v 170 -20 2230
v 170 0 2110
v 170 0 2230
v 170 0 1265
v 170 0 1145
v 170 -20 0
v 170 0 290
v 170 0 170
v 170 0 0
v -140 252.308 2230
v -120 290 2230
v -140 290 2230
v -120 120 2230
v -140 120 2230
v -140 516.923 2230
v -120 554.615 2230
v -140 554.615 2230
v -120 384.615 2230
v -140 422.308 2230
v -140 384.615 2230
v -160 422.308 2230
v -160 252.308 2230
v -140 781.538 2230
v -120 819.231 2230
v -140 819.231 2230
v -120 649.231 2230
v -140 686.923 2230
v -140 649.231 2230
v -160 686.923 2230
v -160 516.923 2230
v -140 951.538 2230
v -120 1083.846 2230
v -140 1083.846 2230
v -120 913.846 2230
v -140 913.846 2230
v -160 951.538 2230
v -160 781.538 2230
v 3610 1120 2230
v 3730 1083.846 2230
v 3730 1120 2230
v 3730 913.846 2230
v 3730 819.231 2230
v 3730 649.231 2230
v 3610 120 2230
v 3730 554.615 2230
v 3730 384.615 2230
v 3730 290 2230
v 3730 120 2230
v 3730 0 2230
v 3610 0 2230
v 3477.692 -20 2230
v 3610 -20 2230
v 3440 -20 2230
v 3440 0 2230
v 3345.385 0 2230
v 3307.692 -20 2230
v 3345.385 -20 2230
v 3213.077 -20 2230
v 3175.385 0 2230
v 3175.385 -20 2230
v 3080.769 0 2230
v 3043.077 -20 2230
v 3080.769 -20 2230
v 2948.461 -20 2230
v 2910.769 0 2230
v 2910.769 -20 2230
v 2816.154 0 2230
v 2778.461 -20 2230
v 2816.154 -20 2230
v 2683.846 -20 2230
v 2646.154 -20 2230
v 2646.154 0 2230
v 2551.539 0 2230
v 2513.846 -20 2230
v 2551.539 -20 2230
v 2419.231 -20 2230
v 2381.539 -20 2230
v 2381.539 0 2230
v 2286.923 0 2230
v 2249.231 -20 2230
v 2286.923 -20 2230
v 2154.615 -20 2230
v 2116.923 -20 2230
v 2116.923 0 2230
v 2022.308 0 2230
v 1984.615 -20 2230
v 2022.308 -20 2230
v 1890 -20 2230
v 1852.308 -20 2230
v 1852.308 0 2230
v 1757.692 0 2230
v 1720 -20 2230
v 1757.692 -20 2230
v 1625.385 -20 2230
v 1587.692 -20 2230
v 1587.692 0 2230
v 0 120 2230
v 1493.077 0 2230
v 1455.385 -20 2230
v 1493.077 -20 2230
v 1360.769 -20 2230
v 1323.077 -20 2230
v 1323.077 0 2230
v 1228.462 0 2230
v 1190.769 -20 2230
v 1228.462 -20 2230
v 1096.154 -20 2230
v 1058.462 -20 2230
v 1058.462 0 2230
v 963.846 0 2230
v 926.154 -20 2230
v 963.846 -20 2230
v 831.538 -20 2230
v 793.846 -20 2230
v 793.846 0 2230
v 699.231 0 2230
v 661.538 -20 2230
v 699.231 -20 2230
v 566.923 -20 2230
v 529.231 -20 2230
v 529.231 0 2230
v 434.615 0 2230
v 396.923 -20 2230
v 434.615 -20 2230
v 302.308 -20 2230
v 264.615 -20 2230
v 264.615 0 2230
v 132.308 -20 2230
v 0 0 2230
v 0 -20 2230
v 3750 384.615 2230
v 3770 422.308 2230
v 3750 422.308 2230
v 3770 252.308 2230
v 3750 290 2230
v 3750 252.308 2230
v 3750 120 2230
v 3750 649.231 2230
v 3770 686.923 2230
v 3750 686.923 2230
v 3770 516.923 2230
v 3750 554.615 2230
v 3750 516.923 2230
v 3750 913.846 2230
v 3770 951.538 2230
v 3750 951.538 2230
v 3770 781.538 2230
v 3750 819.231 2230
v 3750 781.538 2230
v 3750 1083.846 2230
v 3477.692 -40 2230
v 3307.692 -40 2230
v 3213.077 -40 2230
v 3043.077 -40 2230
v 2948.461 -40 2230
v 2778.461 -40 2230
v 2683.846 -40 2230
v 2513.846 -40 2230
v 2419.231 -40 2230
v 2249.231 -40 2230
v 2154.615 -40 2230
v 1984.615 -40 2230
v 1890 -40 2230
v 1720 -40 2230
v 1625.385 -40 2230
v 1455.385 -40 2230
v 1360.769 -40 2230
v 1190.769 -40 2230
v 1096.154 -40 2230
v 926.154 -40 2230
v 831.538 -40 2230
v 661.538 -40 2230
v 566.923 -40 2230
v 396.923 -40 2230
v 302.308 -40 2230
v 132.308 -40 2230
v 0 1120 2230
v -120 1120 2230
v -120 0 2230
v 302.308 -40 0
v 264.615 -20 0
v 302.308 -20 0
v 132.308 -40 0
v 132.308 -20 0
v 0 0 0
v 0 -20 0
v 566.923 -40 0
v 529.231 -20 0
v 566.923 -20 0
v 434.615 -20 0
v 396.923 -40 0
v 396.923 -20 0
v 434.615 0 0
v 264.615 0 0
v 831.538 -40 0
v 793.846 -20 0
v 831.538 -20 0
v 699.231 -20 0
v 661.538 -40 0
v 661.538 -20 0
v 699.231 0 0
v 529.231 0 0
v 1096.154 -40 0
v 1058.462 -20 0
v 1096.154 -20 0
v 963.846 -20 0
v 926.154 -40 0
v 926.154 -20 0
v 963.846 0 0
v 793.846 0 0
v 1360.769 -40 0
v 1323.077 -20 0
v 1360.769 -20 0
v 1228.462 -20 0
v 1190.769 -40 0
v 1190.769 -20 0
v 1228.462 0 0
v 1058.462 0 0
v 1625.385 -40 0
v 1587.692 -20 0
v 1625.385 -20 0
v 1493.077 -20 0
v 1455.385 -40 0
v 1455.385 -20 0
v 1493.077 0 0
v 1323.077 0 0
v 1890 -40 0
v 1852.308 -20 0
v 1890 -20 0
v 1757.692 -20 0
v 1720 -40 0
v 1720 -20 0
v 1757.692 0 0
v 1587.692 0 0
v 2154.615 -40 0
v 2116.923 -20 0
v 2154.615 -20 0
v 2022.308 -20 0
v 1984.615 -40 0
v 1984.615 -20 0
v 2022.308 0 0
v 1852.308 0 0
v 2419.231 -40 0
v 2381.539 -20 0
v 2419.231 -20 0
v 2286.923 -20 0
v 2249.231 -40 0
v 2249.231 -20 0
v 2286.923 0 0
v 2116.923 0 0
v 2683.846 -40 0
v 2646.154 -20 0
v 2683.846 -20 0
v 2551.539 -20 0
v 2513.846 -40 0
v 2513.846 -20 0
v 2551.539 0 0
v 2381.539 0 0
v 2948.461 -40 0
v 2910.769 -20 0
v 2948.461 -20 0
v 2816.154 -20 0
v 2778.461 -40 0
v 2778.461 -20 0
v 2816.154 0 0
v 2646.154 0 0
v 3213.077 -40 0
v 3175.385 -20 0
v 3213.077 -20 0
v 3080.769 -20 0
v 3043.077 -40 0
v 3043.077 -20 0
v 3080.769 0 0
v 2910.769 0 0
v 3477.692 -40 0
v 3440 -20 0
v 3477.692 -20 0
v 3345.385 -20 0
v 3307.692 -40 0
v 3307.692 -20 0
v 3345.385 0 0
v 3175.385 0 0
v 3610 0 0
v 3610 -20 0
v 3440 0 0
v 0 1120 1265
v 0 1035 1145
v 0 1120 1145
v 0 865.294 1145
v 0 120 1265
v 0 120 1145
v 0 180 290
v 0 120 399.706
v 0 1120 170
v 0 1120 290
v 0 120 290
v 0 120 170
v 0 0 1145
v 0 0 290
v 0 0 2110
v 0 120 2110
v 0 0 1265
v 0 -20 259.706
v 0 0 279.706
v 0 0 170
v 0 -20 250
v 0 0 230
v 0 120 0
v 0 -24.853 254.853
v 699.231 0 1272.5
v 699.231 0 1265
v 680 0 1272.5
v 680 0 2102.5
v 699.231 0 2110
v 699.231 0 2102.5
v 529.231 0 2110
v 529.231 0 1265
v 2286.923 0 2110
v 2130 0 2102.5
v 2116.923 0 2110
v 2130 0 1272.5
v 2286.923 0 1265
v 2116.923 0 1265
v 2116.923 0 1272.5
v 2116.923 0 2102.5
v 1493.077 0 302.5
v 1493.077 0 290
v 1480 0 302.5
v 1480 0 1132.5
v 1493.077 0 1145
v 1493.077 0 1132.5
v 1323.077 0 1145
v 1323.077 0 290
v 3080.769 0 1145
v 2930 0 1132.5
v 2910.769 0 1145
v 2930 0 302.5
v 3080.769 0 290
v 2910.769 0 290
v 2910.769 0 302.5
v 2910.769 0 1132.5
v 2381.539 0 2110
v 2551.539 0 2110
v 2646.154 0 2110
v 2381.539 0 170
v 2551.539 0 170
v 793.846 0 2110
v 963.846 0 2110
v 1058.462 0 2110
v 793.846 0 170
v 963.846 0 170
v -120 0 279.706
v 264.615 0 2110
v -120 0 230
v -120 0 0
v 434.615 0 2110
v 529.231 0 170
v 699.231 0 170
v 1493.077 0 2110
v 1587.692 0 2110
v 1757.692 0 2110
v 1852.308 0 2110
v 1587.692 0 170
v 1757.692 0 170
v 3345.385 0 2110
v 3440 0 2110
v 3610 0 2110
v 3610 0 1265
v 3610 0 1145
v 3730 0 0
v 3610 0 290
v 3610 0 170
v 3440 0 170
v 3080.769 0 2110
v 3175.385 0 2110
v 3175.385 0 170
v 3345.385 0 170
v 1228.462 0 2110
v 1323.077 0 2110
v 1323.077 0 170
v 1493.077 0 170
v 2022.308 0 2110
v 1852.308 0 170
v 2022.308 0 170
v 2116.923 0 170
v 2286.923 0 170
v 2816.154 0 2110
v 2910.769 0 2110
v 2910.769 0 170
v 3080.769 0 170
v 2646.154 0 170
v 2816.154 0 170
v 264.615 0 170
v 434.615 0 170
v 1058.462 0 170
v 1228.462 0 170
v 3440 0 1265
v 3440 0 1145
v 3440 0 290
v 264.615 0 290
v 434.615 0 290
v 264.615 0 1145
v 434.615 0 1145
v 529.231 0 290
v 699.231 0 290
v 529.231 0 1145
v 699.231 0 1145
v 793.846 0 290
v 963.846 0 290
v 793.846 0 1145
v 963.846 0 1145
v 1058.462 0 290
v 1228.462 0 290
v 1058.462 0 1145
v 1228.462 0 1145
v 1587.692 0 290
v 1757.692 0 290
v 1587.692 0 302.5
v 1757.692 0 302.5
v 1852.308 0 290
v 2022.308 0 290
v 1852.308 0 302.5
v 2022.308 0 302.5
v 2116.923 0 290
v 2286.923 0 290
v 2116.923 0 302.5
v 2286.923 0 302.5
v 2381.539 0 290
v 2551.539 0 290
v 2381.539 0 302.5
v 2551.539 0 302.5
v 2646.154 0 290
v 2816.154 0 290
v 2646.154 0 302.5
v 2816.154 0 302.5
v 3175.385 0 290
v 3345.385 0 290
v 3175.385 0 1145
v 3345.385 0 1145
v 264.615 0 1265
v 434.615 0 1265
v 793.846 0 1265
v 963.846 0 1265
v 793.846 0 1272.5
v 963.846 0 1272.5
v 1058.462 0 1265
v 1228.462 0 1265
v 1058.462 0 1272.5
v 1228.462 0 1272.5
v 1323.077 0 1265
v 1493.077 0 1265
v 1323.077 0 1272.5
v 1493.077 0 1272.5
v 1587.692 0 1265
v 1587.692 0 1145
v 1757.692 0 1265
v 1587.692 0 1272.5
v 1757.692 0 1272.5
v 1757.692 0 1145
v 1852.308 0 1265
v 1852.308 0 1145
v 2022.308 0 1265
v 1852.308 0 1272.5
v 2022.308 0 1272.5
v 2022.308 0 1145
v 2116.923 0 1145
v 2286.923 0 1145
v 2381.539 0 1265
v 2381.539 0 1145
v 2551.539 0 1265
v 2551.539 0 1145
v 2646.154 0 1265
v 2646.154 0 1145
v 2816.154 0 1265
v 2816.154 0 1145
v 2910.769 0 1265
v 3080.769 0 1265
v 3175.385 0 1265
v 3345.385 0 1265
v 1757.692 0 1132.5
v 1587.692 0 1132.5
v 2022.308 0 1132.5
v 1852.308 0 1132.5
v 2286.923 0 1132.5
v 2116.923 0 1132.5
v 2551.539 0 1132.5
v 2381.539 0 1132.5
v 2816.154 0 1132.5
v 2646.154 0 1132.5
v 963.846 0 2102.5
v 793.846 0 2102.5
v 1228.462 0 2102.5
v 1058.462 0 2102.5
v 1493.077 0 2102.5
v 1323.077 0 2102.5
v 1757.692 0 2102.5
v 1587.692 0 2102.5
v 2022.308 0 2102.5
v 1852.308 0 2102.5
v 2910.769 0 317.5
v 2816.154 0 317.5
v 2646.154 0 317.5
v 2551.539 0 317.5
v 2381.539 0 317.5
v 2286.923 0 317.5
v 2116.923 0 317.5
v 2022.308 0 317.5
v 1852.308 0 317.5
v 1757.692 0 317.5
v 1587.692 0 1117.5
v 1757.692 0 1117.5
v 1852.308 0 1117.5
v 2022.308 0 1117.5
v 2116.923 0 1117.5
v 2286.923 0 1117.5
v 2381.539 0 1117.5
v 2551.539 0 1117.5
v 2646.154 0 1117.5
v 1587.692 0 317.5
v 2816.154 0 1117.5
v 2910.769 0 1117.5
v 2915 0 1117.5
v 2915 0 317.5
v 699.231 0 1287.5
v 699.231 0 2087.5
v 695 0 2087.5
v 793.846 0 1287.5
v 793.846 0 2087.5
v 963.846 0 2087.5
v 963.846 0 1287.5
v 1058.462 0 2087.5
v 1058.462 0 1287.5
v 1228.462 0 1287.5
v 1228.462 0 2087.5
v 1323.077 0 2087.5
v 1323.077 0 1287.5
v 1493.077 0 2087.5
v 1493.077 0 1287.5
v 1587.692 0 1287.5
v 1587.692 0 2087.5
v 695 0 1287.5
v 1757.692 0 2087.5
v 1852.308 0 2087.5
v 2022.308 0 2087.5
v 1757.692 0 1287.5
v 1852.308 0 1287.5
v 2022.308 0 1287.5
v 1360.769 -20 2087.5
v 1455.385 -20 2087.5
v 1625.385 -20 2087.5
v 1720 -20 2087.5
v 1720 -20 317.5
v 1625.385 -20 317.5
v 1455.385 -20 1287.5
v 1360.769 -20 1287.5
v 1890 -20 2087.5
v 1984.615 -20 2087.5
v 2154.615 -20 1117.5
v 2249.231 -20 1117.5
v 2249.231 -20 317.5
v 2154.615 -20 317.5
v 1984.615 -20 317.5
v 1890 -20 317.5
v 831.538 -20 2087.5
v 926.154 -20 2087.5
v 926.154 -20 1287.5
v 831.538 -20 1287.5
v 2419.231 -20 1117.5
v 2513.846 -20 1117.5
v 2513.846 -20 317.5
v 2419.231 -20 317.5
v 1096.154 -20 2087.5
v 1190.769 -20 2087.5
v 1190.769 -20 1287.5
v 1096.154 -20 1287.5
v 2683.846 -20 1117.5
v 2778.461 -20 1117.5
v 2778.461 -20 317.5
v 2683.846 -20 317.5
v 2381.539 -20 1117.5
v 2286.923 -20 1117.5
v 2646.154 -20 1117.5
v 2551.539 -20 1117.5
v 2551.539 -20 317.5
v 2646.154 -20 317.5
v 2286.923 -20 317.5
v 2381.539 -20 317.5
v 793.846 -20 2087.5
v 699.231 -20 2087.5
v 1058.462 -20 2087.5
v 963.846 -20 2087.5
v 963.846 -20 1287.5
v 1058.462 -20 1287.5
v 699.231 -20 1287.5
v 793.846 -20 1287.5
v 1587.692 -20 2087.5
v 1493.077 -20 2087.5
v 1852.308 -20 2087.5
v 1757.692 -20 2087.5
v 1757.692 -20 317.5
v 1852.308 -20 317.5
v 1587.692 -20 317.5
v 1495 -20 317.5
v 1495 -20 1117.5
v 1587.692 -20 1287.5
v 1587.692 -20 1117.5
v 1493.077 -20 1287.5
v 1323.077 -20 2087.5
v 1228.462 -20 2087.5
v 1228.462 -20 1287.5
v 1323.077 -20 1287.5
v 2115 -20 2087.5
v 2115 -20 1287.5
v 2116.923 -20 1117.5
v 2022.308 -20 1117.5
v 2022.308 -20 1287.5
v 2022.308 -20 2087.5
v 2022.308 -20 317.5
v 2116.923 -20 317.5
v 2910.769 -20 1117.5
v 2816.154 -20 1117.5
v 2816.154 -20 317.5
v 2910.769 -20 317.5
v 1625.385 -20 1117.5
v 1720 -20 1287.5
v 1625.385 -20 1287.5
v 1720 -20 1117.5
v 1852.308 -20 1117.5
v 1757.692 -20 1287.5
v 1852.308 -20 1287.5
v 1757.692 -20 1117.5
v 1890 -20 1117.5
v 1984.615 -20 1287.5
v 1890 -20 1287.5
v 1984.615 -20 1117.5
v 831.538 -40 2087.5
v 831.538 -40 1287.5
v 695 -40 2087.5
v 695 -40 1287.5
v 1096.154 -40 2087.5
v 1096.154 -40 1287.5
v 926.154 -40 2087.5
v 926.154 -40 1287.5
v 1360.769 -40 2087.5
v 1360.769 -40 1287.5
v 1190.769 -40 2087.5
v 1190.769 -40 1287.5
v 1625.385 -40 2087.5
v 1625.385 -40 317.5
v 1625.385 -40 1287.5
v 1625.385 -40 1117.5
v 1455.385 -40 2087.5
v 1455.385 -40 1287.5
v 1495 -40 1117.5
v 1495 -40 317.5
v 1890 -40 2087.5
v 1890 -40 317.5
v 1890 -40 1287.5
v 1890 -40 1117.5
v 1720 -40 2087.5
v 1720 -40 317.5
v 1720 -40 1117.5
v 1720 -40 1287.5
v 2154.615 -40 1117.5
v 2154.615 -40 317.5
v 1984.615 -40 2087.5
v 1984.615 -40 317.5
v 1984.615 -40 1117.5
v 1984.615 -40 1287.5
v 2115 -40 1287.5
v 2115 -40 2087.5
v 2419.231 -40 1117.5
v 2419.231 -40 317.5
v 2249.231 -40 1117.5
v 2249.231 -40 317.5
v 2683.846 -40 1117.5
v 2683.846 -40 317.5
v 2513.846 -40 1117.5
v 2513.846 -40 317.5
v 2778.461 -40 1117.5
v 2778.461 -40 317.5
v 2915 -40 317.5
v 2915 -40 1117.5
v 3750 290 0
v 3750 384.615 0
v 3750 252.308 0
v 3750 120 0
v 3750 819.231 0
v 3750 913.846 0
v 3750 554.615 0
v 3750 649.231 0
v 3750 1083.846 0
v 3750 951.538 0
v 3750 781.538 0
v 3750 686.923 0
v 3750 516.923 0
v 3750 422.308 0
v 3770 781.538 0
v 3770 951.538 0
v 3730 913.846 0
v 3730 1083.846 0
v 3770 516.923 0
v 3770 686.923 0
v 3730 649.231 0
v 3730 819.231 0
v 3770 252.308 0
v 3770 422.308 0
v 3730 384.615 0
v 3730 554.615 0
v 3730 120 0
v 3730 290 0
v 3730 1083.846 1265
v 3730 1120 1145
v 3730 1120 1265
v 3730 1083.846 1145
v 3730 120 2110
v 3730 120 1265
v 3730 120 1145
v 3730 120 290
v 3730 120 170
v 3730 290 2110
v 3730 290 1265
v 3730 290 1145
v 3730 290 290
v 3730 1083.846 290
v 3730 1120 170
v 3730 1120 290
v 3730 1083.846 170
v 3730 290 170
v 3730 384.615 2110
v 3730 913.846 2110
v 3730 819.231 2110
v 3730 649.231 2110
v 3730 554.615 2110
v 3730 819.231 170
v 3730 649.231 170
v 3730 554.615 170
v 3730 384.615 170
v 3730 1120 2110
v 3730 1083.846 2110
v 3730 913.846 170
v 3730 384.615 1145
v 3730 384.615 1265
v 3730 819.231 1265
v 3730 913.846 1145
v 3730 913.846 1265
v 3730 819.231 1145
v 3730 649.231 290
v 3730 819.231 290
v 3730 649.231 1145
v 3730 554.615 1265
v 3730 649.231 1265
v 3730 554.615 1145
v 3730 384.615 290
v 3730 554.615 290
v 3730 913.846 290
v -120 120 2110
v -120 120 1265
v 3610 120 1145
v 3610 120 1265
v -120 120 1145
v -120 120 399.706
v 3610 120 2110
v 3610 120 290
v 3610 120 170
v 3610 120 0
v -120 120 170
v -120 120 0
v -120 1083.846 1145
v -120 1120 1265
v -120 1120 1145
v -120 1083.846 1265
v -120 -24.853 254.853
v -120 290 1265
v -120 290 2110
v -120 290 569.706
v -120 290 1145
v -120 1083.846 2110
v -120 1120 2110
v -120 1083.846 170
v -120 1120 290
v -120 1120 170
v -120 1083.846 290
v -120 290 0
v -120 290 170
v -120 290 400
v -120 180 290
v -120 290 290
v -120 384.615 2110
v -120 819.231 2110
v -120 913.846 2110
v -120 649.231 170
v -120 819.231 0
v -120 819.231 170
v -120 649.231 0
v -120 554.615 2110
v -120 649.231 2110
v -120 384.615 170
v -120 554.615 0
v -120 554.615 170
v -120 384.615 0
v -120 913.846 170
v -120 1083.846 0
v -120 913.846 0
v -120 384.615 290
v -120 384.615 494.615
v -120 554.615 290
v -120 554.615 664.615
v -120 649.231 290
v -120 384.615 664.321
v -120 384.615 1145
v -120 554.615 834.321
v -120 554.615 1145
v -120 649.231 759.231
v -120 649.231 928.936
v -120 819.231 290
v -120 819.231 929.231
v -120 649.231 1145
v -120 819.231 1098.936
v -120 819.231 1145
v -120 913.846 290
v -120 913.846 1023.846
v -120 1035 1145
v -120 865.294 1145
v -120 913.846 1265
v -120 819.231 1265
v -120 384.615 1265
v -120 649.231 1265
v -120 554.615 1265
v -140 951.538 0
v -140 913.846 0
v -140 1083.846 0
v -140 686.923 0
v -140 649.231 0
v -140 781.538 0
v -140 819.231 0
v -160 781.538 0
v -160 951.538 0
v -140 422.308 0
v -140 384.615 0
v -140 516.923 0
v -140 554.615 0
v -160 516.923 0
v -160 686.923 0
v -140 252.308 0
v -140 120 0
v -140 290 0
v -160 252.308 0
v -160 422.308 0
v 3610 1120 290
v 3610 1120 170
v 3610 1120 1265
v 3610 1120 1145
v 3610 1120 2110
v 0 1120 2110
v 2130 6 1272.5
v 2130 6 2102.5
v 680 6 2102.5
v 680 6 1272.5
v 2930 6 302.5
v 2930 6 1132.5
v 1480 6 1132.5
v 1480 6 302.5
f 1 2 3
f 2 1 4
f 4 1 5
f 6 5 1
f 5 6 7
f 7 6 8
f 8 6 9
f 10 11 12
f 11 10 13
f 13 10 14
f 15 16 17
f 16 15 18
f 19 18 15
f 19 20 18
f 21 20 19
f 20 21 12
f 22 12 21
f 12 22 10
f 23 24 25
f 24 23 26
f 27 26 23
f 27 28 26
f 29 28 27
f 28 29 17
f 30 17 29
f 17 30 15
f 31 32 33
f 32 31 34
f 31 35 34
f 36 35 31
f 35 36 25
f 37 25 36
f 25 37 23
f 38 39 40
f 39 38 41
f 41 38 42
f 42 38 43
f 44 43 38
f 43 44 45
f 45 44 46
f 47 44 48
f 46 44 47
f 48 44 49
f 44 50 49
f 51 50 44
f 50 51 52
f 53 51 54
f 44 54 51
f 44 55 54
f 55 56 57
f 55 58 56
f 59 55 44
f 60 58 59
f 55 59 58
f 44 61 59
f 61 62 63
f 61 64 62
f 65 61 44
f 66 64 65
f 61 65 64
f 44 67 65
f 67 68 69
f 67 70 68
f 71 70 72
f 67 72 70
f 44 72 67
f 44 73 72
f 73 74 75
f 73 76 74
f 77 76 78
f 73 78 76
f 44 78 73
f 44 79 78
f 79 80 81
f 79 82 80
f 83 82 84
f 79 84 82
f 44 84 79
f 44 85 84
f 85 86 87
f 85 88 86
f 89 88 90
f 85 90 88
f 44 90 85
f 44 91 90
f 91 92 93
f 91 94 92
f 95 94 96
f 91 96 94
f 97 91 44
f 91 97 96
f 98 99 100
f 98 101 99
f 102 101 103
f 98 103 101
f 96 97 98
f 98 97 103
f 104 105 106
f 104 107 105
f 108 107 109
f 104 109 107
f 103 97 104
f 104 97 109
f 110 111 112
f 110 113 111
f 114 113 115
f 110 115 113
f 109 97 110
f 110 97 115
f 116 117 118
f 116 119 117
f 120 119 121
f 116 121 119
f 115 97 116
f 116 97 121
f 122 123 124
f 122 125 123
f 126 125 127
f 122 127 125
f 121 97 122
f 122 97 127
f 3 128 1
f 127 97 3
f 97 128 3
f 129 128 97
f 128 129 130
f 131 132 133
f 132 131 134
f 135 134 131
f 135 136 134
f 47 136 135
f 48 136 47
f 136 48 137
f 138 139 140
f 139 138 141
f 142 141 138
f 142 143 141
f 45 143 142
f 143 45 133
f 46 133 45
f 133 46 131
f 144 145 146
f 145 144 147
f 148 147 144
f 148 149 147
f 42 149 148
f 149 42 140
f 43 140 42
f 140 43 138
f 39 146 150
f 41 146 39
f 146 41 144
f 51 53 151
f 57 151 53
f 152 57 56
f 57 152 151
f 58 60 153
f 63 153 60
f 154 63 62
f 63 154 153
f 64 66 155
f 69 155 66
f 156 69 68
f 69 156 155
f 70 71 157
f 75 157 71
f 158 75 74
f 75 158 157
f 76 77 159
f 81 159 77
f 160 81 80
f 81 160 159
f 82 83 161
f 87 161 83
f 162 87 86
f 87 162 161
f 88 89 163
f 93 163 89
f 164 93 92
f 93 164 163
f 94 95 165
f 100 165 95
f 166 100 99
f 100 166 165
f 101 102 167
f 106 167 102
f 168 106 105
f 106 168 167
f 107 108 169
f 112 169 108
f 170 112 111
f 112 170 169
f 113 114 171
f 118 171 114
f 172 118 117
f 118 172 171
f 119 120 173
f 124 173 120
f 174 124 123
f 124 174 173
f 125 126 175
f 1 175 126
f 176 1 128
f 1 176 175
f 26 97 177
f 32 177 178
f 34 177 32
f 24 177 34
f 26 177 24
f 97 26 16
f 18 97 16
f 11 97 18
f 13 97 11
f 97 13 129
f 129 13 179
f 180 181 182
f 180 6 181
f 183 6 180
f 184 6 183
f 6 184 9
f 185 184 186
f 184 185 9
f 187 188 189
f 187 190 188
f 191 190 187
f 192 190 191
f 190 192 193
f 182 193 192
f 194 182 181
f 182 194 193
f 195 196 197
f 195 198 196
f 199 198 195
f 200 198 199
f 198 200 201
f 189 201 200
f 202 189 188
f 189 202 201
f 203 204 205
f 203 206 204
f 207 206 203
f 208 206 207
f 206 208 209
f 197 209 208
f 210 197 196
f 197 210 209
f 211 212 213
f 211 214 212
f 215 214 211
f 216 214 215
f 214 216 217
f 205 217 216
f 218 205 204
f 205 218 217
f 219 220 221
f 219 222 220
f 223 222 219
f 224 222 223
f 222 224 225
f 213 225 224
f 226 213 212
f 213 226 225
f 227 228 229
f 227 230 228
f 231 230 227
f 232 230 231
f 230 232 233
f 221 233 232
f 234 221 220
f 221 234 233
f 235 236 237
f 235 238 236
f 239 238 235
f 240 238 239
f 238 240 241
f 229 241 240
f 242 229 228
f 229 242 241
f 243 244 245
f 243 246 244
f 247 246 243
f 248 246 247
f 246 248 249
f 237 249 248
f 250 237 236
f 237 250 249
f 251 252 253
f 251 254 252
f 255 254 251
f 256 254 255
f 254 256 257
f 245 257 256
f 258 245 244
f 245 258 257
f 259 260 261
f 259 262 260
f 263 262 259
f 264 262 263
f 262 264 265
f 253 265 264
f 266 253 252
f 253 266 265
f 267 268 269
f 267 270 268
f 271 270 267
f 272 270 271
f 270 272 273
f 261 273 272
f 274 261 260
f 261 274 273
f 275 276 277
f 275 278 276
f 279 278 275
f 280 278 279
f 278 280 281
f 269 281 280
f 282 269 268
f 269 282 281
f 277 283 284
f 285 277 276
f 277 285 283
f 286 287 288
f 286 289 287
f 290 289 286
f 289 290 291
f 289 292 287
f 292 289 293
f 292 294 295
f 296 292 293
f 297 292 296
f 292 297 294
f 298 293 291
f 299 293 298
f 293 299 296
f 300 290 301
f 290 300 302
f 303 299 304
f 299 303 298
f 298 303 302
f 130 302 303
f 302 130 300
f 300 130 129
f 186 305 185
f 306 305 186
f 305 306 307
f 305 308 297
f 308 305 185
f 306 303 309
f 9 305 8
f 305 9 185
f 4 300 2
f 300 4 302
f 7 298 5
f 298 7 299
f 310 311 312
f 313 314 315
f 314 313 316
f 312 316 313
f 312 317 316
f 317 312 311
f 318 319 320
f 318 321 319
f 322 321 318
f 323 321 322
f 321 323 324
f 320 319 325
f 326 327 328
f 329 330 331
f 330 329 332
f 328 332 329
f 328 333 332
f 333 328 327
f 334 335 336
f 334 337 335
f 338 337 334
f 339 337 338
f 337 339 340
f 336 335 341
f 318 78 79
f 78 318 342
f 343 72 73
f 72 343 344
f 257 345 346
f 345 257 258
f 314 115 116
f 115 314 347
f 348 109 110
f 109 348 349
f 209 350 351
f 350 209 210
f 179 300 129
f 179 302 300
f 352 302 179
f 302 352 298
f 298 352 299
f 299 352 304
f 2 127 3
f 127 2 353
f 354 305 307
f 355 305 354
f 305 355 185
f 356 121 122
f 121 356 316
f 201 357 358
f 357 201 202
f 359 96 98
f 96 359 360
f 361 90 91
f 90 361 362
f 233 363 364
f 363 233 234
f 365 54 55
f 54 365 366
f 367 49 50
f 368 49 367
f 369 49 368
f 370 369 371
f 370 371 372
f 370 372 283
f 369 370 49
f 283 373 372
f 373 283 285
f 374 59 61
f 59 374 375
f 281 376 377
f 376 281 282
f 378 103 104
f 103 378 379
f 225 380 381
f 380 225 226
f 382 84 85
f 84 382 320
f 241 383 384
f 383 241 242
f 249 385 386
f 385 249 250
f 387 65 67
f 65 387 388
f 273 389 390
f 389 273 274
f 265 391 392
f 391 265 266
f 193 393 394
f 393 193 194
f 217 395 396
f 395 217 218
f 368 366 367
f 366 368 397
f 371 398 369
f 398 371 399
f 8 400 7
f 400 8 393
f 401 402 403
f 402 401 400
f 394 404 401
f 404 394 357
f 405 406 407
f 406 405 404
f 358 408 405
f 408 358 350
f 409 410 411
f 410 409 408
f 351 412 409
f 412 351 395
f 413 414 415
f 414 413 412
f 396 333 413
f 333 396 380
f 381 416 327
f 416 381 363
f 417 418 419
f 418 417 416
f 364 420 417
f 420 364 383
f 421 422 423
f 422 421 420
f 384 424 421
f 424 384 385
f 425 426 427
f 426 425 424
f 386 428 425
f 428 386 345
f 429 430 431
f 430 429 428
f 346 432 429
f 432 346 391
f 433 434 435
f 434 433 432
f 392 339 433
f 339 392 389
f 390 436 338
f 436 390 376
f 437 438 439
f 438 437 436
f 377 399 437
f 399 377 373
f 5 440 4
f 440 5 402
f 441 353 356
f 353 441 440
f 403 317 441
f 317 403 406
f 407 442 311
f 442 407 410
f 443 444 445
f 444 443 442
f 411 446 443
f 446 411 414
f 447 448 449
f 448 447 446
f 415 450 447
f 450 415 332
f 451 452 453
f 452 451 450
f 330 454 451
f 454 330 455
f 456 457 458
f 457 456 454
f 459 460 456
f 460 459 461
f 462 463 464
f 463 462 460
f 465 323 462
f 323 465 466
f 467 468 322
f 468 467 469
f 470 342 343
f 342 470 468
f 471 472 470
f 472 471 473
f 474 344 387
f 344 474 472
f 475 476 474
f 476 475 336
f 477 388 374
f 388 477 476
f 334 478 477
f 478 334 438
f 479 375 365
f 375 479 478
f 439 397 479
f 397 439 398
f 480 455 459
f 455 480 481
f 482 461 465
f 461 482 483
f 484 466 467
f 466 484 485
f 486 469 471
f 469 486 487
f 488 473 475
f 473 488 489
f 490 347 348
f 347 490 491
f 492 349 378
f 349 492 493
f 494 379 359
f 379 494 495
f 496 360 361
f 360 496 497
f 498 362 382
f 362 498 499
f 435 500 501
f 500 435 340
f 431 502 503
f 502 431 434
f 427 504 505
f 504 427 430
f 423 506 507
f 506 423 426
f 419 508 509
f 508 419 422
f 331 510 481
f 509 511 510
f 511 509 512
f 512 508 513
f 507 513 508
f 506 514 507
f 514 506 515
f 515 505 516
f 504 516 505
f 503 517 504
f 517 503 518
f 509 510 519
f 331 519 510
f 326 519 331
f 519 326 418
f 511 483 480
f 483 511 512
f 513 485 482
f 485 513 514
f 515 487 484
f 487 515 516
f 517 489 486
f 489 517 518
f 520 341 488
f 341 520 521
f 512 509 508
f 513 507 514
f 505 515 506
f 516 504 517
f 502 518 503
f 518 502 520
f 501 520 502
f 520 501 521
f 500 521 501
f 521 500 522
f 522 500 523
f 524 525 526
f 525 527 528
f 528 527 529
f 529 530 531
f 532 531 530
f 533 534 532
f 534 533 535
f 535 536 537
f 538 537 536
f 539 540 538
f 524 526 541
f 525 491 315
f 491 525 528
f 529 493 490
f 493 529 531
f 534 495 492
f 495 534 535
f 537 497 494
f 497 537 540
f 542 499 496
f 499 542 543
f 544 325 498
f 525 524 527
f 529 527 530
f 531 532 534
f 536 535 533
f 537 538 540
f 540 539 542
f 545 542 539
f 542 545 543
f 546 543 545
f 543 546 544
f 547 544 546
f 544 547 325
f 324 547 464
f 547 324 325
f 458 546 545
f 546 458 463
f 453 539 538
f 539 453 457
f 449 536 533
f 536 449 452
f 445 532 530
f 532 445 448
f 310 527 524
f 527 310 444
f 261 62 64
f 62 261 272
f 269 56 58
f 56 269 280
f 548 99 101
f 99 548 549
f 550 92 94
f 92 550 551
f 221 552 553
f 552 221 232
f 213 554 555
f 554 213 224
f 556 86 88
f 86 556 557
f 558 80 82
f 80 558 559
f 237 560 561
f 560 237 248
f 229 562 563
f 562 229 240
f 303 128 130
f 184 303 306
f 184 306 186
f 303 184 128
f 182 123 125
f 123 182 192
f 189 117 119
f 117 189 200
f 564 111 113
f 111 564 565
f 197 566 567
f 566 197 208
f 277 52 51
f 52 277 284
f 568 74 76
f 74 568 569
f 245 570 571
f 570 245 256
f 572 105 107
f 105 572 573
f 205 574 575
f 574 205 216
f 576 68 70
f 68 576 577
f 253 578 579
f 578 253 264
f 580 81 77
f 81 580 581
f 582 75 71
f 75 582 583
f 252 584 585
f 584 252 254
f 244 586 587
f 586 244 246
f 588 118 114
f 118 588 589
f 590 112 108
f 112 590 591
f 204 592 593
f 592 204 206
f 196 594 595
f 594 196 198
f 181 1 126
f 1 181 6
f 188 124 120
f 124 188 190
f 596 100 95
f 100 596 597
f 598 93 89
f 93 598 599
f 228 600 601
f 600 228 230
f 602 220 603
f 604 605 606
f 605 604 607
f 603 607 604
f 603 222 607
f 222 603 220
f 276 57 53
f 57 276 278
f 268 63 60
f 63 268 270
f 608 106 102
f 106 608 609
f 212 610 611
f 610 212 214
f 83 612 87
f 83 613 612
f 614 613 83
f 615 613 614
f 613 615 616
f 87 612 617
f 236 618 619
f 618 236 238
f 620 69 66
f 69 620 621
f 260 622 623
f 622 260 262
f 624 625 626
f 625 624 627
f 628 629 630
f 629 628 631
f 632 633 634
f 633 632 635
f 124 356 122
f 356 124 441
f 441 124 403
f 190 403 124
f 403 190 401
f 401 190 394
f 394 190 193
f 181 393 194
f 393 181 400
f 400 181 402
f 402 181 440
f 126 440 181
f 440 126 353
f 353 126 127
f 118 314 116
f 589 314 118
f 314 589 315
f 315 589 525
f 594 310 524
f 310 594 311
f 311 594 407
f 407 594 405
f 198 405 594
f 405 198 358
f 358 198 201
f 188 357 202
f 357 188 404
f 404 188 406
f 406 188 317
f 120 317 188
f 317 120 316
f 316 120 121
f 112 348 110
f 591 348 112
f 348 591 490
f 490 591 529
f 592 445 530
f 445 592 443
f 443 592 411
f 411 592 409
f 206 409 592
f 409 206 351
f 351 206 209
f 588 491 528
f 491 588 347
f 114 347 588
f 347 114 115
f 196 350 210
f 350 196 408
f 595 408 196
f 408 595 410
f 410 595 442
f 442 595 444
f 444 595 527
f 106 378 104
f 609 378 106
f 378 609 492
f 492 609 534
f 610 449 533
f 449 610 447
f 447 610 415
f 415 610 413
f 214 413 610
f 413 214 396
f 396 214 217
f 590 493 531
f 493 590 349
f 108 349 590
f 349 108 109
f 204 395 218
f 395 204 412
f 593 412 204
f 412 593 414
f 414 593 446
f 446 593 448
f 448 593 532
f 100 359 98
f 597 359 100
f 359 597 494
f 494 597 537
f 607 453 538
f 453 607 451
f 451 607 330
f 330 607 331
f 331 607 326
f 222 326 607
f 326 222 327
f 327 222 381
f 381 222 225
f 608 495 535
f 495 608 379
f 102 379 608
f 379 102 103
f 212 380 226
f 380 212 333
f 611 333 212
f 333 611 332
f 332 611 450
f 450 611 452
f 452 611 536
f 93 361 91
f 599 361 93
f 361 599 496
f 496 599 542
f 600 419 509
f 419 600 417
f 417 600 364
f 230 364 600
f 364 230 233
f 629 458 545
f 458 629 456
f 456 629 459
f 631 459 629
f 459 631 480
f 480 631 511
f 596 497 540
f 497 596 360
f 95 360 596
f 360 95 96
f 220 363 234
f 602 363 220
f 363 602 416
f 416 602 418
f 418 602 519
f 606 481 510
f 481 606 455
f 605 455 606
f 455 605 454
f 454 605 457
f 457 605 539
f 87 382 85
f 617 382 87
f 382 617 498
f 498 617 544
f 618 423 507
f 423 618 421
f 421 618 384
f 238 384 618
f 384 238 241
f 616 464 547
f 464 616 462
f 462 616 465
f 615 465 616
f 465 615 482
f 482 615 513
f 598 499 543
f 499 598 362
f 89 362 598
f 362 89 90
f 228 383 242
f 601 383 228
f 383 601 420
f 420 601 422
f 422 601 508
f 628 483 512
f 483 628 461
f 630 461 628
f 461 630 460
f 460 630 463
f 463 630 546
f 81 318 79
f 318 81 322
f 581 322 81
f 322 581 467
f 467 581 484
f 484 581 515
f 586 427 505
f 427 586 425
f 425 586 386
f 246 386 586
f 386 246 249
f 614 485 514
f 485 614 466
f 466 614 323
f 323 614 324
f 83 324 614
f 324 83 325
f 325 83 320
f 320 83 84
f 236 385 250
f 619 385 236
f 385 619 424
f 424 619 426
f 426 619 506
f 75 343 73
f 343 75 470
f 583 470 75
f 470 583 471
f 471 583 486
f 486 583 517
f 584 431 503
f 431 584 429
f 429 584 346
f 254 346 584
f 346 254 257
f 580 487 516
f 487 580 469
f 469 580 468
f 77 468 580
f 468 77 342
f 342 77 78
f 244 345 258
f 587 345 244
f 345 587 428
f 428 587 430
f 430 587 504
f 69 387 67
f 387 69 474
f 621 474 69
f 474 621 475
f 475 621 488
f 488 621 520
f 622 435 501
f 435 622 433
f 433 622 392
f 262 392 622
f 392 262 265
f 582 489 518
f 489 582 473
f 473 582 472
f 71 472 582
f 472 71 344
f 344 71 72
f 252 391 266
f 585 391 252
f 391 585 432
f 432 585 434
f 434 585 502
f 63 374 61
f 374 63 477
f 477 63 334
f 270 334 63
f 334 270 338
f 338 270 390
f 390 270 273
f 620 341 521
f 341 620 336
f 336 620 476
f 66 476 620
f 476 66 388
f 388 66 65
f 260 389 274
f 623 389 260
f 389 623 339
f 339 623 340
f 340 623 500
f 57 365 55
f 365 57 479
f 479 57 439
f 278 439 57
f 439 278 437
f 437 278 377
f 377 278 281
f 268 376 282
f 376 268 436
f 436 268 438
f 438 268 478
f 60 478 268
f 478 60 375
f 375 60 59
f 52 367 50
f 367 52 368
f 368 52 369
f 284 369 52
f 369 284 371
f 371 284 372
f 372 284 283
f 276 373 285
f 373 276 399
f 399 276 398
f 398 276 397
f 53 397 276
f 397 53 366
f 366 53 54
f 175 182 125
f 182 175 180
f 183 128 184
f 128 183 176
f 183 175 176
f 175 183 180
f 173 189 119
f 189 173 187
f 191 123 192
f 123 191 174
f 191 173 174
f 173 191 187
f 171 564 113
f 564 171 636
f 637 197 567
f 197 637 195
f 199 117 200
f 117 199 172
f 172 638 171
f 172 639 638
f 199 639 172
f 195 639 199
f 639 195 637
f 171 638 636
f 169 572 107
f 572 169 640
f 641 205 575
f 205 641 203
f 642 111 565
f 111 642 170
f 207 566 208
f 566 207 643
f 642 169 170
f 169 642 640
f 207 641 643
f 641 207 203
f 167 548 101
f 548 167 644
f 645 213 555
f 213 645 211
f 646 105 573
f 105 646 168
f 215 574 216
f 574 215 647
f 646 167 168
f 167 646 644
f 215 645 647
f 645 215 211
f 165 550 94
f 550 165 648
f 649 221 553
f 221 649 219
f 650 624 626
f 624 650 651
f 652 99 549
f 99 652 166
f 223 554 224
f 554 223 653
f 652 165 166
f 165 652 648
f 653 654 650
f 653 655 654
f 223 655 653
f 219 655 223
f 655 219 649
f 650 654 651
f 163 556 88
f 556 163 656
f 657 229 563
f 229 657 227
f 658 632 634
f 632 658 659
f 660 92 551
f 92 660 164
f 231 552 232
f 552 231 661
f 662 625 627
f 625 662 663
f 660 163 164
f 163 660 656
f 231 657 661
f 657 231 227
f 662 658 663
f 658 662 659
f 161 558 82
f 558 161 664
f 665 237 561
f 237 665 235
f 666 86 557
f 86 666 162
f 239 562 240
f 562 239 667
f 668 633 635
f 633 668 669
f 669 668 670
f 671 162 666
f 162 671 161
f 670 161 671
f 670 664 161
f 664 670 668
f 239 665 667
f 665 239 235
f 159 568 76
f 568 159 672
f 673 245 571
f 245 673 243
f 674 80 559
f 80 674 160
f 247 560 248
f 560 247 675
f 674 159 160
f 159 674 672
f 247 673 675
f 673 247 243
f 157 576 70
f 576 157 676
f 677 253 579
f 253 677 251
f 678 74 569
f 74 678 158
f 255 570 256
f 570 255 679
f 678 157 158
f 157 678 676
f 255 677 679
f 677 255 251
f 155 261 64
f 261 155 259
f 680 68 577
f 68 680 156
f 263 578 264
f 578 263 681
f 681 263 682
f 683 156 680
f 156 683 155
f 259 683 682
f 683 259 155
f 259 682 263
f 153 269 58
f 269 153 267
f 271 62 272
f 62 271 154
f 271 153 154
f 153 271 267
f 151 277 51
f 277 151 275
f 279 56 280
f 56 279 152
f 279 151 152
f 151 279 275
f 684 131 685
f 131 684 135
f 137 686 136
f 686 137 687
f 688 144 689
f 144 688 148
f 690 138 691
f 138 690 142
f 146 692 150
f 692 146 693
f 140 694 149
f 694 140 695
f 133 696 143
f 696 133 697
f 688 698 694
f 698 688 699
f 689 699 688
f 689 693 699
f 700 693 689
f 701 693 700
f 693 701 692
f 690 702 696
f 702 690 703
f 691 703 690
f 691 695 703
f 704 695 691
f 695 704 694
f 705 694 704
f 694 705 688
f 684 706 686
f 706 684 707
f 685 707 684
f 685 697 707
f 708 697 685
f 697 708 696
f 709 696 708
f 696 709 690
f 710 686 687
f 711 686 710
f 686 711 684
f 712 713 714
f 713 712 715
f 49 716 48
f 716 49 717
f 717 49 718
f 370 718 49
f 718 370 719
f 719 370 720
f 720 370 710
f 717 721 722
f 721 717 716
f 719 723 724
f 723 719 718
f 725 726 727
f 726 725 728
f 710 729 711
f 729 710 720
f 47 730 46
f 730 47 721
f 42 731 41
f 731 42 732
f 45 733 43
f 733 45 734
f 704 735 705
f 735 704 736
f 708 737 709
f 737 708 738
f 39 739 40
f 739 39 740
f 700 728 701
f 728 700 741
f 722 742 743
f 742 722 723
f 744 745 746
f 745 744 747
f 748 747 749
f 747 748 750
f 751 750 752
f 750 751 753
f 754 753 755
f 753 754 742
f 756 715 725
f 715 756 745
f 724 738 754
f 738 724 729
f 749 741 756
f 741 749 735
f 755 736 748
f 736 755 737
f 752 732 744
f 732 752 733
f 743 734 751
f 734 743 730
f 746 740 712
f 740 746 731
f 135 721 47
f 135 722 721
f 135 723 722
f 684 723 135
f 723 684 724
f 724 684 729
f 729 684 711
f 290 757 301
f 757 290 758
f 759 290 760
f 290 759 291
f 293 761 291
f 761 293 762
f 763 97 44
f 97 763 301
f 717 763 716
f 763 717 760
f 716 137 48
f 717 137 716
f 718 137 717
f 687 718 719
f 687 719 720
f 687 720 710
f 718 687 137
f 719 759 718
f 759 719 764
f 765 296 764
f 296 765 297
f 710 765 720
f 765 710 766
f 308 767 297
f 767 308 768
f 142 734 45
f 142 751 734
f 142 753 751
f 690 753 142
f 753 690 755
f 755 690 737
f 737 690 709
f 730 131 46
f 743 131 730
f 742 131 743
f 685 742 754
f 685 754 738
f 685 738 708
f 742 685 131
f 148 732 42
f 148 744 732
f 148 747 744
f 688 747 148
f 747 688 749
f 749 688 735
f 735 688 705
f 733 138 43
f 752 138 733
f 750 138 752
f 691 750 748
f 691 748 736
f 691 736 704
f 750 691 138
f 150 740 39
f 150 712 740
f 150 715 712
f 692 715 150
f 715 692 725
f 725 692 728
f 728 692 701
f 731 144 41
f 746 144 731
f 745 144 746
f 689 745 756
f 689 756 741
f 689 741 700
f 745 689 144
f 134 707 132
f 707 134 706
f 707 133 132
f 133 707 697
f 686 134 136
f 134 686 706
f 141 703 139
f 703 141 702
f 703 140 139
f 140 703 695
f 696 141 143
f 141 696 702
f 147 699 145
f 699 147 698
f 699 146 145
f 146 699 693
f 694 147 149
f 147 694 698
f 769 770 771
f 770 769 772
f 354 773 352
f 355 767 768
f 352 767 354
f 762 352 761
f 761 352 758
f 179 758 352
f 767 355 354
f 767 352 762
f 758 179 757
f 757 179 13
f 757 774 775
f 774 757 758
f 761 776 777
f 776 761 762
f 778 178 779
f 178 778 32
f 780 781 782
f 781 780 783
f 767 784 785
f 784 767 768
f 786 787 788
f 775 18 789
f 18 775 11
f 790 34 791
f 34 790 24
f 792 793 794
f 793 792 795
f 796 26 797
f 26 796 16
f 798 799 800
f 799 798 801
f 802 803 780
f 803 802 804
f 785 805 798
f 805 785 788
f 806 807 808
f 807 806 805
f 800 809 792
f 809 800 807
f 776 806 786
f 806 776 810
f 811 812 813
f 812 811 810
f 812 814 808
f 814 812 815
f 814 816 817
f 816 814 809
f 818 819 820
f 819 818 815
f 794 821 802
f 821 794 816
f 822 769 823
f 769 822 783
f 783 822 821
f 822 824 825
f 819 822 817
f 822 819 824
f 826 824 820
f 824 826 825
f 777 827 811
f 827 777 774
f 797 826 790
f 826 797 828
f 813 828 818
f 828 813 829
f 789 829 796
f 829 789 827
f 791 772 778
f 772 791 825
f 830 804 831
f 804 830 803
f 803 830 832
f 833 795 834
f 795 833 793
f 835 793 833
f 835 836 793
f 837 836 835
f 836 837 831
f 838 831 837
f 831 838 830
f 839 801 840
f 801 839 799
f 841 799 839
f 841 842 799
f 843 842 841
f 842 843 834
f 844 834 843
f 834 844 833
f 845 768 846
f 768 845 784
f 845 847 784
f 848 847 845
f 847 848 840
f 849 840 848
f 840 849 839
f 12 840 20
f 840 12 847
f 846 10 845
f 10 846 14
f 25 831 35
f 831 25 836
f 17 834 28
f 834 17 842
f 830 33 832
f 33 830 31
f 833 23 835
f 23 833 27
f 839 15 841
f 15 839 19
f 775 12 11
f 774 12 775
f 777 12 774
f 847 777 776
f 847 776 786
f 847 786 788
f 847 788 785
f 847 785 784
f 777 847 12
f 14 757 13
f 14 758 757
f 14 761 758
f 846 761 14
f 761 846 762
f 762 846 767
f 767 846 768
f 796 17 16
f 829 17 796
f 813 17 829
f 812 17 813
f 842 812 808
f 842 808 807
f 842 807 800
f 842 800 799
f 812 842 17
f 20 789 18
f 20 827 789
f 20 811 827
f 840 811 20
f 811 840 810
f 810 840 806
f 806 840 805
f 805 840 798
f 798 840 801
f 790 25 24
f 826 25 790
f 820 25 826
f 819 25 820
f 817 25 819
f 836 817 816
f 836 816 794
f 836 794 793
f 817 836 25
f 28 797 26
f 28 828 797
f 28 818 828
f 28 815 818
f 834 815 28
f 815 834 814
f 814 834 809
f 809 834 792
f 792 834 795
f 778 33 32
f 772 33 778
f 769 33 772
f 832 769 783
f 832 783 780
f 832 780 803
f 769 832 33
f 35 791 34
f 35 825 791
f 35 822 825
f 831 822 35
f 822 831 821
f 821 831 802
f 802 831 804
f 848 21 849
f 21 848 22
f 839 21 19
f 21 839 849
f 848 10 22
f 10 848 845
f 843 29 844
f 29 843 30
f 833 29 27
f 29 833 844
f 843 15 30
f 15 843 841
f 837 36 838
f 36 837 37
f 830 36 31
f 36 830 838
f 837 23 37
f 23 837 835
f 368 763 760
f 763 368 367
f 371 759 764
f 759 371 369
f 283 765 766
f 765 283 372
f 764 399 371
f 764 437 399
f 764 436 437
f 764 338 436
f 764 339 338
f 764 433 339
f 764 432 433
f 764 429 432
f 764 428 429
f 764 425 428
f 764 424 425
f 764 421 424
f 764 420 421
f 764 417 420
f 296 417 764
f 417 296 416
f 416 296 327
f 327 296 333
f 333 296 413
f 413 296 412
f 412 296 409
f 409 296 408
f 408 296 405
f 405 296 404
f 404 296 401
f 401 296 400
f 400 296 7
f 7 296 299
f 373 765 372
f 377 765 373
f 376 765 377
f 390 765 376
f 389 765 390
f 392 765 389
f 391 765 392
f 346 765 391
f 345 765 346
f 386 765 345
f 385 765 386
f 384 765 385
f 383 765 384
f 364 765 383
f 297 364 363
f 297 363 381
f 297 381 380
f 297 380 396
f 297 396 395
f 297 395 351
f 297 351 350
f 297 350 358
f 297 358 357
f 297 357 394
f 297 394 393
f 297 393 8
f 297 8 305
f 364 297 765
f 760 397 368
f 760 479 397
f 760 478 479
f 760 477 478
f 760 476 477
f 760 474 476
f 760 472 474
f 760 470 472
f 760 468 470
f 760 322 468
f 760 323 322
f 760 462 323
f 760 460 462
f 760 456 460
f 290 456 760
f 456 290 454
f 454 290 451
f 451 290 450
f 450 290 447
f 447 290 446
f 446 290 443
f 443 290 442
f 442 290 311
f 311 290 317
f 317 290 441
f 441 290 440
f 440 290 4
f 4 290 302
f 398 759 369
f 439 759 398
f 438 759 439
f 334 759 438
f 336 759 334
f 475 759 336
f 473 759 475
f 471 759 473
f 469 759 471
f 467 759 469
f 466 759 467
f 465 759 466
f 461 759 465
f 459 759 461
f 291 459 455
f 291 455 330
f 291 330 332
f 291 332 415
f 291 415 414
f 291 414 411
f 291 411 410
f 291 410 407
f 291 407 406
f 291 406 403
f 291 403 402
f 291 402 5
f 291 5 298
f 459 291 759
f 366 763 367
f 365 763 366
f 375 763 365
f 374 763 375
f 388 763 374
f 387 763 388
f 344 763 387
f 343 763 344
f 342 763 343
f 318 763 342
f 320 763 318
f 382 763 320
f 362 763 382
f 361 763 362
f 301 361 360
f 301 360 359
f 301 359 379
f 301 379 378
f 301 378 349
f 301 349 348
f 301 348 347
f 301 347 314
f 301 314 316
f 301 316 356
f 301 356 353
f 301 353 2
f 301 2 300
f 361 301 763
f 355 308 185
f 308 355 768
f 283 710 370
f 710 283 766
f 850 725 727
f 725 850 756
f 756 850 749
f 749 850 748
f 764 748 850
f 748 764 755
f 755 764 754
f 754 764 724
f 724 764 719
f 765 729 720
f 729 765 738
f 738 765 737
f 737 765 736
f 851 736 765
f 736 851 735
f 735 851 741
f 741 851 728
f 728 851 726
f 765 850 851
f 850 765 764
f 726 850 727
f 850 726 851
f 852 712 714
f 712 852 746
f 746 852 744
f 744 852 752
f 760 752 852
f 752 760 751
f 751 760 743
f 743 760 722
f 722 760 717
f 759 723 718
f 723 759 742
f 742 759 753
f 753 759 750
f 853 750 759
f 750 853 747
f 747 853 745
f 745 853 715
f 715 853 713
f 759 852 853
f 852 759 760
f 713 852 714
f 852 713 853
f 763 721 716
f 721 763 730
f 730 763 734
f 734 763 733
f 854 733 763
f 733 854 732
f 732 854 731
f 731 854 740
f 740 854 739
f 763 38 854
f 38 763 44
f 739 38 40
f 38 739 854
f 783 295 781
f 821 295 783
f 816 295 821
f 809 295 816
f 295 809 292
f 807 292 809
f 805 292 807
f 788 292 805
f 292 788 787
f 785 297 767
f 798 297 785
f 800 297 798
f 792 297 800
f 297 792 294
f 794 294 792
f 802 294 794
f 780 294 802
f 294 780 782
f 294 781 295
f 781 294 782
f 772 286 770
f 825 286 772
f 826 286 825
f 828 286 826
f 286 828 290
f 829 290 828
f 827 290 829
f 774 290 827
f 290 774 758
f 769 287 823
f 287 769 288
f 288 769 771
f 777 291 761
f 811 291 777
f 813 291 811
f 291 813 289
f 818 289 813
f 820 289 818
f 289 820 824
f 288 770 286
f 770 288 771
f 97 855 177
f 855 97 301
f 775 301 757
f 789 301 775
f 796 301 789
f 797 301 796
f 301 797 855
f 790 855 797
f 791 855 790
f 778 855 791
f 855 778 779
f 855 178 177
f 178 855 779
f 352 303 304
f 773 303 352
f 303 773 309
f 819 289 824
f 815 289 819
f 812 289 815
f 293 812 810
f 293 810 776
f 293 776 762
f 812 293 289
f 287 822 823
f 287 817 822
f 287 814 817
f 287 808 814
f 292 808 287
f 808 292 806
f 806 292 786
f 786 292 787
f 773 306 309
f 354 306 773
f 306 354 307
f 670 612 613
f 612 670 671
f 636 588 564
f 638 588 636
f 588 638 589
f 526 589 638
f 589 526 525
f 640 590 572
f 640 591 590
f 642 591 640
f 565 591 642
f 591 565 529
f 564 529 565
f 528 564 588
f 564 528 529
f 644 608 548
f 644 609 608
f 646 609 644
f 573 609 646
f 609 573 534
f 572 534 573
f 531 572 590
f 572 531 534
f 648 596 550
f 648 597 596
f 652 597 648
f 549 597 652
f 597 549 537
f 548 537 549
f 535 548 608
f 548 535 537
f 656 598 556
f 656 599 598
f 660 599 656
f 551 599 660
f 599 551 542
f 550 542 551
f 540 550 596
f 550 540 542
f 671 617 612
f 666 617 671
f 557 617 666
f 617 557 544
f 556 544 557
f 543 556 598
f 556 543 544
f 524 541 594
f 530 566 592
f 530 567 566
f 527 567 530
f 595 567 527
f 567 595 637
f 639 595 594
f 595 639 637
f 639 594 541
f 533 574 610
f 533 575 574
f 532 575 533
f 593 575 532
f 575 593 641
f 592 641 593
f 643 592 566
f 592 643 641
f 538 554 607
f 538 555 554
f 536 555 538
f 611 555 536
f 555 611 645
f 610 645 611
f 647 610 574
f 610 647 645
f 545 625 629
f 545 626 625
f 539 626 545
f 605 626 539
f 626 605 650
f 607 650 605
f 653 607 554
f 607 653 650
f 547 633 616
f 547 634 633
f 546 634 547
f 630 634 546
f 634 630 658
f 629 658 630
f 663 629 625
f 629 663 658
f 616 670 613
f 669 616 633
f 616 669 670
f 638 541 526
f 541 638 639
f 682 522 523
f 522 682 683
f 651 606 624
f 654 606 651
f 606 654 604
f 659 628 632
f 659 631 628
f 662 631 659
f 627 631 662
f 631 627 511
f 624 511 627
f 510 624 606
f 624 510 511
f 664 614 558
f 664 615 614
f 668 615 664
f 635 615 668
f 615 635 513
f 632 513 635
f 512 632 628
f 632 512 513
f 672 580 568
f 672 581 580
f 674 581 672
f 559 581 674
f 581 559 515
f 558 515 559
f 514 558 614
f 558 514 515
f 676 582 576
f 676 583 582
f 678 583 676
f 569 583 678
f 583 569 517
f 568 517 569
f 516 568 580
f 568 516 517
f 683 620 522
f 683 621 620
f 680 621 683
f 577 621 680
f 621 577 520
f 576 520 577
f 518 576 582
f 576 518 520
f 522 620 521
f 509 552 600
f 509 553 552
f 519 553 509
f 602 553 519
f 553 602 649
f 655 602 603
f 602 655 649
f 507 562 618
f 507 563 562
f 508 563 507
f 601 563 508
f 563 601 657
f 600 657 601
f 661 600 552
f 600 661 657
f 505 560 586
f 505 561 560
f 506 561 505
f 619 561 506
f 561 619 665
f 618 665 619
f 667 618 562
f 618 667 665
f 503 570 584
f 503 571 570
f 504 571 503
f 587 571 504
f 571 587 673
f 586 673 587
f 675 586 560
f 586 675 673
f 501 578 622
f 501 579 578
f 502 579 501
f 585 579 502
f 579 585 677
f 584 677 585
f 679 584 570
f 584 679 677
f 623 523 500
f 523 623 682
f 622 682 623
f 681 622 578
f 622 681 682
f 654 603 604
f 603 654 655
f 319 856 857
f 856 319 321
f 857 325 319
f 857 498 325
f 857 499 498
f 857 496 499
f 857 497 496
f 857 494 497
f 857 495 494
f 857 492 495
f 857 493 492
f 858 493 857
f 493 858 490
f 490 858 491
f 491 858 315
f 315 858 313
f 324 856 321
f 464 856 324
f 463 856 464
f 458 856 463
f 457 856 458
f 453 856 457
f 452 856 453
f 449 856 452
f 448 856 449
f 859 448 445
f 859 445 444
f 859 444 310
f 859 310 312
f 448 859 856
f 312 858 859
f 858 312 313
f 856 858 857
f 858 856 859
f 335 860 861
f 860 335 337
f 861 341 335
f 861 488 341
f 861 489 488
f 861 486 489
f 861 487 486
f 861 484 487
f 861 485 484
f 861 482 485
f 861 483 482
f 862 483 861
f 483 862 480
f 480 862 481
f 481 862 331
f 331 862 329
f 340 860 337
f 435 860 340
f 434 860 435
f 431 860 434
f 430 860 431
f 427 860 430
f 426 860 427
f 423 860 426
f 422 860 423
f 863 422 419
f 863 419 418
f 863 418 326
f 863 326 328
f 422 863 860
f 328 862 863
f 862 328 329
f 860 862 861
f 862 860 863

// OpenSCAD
// Balkenabstand oben 845 mm
// Balkenabstand unten 855 mm

laenge_balken=3610;
dicke_balken=120;
hoehe_unterkante_balken1=170;
hoehe_unterkante_balken2=1145;
hoehe_unterkante_balken3=2110;
dicke_brett=20;
breite_brett=170;
hoehe_brett=hoehe_unterkante_balken3+dicke_balken;
anzahl_bretter=14;
breite_ansatz=1000;
anzahl_bretter_ansatz=4;
brett_mittenabstand = (laenge_balken-breite_brett)/(anzahl_bretter-1);
versatz_aussenbrett=brett_mittenabstand- (brett_mittenabstand-breite_brett)/2 - breite_brett/2;

breite_fenster=1450;
hoehe_fenster=830;
dicke_glas=6;
ueberstand_glas = 15;
mitte_x_fenster=laenge_balken/2;
mitte_y_fenster_1=(hoehe_unterkante_balken2 + dicke_balken + hoehe_unterkante_balken3)/2;
mitte_y_fenster_2=(hoehe_unterkante_balken1 + dicke_balken + hoehe_unterkante_balken2)/2;
versatz_fenster_x=-400;

module brett_innen(breite, dicke){
    color([0.8,0.8,0.8]) cube([breite, dicke, hoehe_brett]);     
    }

module brett_aussen(breite, dicke){
    color([0.9,0.9,0.9]) cube([breite, dicke, hoehe_brett]); 
    }

module wand(){
    // Wand frontal
    translate([0,0,hoehe_unterkante_balken1]){cube([laenge_balken, dicke_balken, dicke_balken]);}
    translate([0,0,hoehe_unterkante_balken2]){cube([laenge_balken, dicke_balken, dicke_balken]);}
    translate([0,0,hoehe_unterkante_balken3]){cube([laenge_balken, dicke_balken, dicke_balken]);}
    translate([-dicke_balken,0,0]){cube([dicke_balken, dicke_balken, hoehe_unterkante_balken3+dicke_balken]);}
    translate([laenge_balken,0,0]){cube([dicke_balken, dicke_balken, hoehe_unterkante_balken3+dicke_balken]);}

    for (i = [0 : anzahl_bretter-1]) {
        translate([brett_mittenabstand * i, -dicke_brett ,0]) {
            brett_innen(breite_brett, dicke_brett); 
            }
        }
    for (i = [0 : anzahl_bretter-2]) {
        translate([brett_mittenabstand * i + versatz_aussenbrett, -dicke_brett*2 ,0]) { 
            brett_aussen(breite_brett, dicke_brett); 
            }
        }

    //Wand links
    translate([laenge_balken,dicke_balken,hoehe_unterkante_balken1]){cube([dicke_balken, breite_ansatz, dicke_balken]);}
    translate([laenge_balken,dicke_balken,hoehe_unterkante_balken2]){cube([dicke_balken, breite_ansatz, dicke_balken]);}
    translate([laenge_balken,dicke_balken,hoehe_unterkante_balken3]){cube([dicke_balken, breite_ansatz, dicke_balken]);}

    for (i = [0 : anzahl_bretter_ansatz-1]) {
        translate([laenge_balken+dicke_balken, brett_mittenabstand * i+dicke_balken ,0]) { 
            brett_innen(dicke_brett, breite_brett); 
            }
        }
    for (i = [0 : anzahl_bretter_ansatz-2]) {
        translate([laenge_balken+dicke_balken+dicke_brett, brett_mittenabstand * i + dicke_balken + versatz_aussenbrett, 0]) { 
            brett_aussen(dicke_brett, breite_brett); 
            }
        }

    // wand rechts
    translate([-dicke_balken,dicke_balken,hoehe_unterkante_balken1]){cube([dicke_balken, breite_ansatz, dicke_balken]);}
    translate([-dicke_balken,dicke_balken,hoehe_unterkante_balken2]){cube([dicke_balken, breite_ansatz, dicke_balken]);}
    translate([-dicke_balken,dicke_balken,hoehe_unterkante_balken3]){cube([dicke_balken, breite_ansatz, dicke_balken]);}
    // diagonaler Balken
    translate([-dicke_balken,dicke_balken/2,hoehe_unterkante_balken1]){
        rotate([45,0,0]){cube([dicke_balken, breite_ansatz*sqrt(2), dicke_balken]);}
        }

    for (i = [0 : anzahl_bretter_ansatz-1]) {
        translate([-dicke_brett-dicke_balken, brett_mittenabstand * i+dicke_balken ,0]) { 
            brett_innen(dicke_brett, breite_brett); 
            }
        }
    for (i = [0 : anzahl_bretter_ansatz-2]) {
        translate([-dicke_brett*2-dicke_balken, brett_mittenabstand * i + dicke_balken + versatz_aussenbrett, 0]) { 
            brett_aussen(dicke_brett, breite_brett); 
            }
        }
    }
    
    
module fenster_loch(mitte_x, mitte_y){
    translate([mitte_x-breite_fenster/2+ueberstand_glas, -dicke_brett*2-10, mitte_y-hoehe_fenster/2+ueberstand_glas]) { 
        cube([breite_fenster-ueberstand_glas*2, dicke_brett*2+20, hoehe_fenster-ueberstand_glas*2]); }    
    }   
   
module fenster_glas(mitte_x, mitte_y){
    translate([mitte_x-breite_fenster/2, 0, mitte_y-hoehe_fenster/2]) { 
        color([0.5,0.5,0.5,0.4]) { 
            cube([breite_fenster, dicke_glas, hoehe_fenster]); 
            }
        }
    }    

difference(){
    wand();
    union(){
        fenster_loch(mitte_x_fenster+versatz_fenster_x, mitte_y_fenster_1);
        fenster_loch(mitte_x_fenster-versatz_fenster_x, mitte_y_fenster_2);
        }
    }
fenster_glas(mitte_x_fenster+versatz_fenster_x, mitte_y_fenster_1);
fenster_glas(mitte_x_fenster-versatz_fenster_x, mitte_y_fenster_2);
    
